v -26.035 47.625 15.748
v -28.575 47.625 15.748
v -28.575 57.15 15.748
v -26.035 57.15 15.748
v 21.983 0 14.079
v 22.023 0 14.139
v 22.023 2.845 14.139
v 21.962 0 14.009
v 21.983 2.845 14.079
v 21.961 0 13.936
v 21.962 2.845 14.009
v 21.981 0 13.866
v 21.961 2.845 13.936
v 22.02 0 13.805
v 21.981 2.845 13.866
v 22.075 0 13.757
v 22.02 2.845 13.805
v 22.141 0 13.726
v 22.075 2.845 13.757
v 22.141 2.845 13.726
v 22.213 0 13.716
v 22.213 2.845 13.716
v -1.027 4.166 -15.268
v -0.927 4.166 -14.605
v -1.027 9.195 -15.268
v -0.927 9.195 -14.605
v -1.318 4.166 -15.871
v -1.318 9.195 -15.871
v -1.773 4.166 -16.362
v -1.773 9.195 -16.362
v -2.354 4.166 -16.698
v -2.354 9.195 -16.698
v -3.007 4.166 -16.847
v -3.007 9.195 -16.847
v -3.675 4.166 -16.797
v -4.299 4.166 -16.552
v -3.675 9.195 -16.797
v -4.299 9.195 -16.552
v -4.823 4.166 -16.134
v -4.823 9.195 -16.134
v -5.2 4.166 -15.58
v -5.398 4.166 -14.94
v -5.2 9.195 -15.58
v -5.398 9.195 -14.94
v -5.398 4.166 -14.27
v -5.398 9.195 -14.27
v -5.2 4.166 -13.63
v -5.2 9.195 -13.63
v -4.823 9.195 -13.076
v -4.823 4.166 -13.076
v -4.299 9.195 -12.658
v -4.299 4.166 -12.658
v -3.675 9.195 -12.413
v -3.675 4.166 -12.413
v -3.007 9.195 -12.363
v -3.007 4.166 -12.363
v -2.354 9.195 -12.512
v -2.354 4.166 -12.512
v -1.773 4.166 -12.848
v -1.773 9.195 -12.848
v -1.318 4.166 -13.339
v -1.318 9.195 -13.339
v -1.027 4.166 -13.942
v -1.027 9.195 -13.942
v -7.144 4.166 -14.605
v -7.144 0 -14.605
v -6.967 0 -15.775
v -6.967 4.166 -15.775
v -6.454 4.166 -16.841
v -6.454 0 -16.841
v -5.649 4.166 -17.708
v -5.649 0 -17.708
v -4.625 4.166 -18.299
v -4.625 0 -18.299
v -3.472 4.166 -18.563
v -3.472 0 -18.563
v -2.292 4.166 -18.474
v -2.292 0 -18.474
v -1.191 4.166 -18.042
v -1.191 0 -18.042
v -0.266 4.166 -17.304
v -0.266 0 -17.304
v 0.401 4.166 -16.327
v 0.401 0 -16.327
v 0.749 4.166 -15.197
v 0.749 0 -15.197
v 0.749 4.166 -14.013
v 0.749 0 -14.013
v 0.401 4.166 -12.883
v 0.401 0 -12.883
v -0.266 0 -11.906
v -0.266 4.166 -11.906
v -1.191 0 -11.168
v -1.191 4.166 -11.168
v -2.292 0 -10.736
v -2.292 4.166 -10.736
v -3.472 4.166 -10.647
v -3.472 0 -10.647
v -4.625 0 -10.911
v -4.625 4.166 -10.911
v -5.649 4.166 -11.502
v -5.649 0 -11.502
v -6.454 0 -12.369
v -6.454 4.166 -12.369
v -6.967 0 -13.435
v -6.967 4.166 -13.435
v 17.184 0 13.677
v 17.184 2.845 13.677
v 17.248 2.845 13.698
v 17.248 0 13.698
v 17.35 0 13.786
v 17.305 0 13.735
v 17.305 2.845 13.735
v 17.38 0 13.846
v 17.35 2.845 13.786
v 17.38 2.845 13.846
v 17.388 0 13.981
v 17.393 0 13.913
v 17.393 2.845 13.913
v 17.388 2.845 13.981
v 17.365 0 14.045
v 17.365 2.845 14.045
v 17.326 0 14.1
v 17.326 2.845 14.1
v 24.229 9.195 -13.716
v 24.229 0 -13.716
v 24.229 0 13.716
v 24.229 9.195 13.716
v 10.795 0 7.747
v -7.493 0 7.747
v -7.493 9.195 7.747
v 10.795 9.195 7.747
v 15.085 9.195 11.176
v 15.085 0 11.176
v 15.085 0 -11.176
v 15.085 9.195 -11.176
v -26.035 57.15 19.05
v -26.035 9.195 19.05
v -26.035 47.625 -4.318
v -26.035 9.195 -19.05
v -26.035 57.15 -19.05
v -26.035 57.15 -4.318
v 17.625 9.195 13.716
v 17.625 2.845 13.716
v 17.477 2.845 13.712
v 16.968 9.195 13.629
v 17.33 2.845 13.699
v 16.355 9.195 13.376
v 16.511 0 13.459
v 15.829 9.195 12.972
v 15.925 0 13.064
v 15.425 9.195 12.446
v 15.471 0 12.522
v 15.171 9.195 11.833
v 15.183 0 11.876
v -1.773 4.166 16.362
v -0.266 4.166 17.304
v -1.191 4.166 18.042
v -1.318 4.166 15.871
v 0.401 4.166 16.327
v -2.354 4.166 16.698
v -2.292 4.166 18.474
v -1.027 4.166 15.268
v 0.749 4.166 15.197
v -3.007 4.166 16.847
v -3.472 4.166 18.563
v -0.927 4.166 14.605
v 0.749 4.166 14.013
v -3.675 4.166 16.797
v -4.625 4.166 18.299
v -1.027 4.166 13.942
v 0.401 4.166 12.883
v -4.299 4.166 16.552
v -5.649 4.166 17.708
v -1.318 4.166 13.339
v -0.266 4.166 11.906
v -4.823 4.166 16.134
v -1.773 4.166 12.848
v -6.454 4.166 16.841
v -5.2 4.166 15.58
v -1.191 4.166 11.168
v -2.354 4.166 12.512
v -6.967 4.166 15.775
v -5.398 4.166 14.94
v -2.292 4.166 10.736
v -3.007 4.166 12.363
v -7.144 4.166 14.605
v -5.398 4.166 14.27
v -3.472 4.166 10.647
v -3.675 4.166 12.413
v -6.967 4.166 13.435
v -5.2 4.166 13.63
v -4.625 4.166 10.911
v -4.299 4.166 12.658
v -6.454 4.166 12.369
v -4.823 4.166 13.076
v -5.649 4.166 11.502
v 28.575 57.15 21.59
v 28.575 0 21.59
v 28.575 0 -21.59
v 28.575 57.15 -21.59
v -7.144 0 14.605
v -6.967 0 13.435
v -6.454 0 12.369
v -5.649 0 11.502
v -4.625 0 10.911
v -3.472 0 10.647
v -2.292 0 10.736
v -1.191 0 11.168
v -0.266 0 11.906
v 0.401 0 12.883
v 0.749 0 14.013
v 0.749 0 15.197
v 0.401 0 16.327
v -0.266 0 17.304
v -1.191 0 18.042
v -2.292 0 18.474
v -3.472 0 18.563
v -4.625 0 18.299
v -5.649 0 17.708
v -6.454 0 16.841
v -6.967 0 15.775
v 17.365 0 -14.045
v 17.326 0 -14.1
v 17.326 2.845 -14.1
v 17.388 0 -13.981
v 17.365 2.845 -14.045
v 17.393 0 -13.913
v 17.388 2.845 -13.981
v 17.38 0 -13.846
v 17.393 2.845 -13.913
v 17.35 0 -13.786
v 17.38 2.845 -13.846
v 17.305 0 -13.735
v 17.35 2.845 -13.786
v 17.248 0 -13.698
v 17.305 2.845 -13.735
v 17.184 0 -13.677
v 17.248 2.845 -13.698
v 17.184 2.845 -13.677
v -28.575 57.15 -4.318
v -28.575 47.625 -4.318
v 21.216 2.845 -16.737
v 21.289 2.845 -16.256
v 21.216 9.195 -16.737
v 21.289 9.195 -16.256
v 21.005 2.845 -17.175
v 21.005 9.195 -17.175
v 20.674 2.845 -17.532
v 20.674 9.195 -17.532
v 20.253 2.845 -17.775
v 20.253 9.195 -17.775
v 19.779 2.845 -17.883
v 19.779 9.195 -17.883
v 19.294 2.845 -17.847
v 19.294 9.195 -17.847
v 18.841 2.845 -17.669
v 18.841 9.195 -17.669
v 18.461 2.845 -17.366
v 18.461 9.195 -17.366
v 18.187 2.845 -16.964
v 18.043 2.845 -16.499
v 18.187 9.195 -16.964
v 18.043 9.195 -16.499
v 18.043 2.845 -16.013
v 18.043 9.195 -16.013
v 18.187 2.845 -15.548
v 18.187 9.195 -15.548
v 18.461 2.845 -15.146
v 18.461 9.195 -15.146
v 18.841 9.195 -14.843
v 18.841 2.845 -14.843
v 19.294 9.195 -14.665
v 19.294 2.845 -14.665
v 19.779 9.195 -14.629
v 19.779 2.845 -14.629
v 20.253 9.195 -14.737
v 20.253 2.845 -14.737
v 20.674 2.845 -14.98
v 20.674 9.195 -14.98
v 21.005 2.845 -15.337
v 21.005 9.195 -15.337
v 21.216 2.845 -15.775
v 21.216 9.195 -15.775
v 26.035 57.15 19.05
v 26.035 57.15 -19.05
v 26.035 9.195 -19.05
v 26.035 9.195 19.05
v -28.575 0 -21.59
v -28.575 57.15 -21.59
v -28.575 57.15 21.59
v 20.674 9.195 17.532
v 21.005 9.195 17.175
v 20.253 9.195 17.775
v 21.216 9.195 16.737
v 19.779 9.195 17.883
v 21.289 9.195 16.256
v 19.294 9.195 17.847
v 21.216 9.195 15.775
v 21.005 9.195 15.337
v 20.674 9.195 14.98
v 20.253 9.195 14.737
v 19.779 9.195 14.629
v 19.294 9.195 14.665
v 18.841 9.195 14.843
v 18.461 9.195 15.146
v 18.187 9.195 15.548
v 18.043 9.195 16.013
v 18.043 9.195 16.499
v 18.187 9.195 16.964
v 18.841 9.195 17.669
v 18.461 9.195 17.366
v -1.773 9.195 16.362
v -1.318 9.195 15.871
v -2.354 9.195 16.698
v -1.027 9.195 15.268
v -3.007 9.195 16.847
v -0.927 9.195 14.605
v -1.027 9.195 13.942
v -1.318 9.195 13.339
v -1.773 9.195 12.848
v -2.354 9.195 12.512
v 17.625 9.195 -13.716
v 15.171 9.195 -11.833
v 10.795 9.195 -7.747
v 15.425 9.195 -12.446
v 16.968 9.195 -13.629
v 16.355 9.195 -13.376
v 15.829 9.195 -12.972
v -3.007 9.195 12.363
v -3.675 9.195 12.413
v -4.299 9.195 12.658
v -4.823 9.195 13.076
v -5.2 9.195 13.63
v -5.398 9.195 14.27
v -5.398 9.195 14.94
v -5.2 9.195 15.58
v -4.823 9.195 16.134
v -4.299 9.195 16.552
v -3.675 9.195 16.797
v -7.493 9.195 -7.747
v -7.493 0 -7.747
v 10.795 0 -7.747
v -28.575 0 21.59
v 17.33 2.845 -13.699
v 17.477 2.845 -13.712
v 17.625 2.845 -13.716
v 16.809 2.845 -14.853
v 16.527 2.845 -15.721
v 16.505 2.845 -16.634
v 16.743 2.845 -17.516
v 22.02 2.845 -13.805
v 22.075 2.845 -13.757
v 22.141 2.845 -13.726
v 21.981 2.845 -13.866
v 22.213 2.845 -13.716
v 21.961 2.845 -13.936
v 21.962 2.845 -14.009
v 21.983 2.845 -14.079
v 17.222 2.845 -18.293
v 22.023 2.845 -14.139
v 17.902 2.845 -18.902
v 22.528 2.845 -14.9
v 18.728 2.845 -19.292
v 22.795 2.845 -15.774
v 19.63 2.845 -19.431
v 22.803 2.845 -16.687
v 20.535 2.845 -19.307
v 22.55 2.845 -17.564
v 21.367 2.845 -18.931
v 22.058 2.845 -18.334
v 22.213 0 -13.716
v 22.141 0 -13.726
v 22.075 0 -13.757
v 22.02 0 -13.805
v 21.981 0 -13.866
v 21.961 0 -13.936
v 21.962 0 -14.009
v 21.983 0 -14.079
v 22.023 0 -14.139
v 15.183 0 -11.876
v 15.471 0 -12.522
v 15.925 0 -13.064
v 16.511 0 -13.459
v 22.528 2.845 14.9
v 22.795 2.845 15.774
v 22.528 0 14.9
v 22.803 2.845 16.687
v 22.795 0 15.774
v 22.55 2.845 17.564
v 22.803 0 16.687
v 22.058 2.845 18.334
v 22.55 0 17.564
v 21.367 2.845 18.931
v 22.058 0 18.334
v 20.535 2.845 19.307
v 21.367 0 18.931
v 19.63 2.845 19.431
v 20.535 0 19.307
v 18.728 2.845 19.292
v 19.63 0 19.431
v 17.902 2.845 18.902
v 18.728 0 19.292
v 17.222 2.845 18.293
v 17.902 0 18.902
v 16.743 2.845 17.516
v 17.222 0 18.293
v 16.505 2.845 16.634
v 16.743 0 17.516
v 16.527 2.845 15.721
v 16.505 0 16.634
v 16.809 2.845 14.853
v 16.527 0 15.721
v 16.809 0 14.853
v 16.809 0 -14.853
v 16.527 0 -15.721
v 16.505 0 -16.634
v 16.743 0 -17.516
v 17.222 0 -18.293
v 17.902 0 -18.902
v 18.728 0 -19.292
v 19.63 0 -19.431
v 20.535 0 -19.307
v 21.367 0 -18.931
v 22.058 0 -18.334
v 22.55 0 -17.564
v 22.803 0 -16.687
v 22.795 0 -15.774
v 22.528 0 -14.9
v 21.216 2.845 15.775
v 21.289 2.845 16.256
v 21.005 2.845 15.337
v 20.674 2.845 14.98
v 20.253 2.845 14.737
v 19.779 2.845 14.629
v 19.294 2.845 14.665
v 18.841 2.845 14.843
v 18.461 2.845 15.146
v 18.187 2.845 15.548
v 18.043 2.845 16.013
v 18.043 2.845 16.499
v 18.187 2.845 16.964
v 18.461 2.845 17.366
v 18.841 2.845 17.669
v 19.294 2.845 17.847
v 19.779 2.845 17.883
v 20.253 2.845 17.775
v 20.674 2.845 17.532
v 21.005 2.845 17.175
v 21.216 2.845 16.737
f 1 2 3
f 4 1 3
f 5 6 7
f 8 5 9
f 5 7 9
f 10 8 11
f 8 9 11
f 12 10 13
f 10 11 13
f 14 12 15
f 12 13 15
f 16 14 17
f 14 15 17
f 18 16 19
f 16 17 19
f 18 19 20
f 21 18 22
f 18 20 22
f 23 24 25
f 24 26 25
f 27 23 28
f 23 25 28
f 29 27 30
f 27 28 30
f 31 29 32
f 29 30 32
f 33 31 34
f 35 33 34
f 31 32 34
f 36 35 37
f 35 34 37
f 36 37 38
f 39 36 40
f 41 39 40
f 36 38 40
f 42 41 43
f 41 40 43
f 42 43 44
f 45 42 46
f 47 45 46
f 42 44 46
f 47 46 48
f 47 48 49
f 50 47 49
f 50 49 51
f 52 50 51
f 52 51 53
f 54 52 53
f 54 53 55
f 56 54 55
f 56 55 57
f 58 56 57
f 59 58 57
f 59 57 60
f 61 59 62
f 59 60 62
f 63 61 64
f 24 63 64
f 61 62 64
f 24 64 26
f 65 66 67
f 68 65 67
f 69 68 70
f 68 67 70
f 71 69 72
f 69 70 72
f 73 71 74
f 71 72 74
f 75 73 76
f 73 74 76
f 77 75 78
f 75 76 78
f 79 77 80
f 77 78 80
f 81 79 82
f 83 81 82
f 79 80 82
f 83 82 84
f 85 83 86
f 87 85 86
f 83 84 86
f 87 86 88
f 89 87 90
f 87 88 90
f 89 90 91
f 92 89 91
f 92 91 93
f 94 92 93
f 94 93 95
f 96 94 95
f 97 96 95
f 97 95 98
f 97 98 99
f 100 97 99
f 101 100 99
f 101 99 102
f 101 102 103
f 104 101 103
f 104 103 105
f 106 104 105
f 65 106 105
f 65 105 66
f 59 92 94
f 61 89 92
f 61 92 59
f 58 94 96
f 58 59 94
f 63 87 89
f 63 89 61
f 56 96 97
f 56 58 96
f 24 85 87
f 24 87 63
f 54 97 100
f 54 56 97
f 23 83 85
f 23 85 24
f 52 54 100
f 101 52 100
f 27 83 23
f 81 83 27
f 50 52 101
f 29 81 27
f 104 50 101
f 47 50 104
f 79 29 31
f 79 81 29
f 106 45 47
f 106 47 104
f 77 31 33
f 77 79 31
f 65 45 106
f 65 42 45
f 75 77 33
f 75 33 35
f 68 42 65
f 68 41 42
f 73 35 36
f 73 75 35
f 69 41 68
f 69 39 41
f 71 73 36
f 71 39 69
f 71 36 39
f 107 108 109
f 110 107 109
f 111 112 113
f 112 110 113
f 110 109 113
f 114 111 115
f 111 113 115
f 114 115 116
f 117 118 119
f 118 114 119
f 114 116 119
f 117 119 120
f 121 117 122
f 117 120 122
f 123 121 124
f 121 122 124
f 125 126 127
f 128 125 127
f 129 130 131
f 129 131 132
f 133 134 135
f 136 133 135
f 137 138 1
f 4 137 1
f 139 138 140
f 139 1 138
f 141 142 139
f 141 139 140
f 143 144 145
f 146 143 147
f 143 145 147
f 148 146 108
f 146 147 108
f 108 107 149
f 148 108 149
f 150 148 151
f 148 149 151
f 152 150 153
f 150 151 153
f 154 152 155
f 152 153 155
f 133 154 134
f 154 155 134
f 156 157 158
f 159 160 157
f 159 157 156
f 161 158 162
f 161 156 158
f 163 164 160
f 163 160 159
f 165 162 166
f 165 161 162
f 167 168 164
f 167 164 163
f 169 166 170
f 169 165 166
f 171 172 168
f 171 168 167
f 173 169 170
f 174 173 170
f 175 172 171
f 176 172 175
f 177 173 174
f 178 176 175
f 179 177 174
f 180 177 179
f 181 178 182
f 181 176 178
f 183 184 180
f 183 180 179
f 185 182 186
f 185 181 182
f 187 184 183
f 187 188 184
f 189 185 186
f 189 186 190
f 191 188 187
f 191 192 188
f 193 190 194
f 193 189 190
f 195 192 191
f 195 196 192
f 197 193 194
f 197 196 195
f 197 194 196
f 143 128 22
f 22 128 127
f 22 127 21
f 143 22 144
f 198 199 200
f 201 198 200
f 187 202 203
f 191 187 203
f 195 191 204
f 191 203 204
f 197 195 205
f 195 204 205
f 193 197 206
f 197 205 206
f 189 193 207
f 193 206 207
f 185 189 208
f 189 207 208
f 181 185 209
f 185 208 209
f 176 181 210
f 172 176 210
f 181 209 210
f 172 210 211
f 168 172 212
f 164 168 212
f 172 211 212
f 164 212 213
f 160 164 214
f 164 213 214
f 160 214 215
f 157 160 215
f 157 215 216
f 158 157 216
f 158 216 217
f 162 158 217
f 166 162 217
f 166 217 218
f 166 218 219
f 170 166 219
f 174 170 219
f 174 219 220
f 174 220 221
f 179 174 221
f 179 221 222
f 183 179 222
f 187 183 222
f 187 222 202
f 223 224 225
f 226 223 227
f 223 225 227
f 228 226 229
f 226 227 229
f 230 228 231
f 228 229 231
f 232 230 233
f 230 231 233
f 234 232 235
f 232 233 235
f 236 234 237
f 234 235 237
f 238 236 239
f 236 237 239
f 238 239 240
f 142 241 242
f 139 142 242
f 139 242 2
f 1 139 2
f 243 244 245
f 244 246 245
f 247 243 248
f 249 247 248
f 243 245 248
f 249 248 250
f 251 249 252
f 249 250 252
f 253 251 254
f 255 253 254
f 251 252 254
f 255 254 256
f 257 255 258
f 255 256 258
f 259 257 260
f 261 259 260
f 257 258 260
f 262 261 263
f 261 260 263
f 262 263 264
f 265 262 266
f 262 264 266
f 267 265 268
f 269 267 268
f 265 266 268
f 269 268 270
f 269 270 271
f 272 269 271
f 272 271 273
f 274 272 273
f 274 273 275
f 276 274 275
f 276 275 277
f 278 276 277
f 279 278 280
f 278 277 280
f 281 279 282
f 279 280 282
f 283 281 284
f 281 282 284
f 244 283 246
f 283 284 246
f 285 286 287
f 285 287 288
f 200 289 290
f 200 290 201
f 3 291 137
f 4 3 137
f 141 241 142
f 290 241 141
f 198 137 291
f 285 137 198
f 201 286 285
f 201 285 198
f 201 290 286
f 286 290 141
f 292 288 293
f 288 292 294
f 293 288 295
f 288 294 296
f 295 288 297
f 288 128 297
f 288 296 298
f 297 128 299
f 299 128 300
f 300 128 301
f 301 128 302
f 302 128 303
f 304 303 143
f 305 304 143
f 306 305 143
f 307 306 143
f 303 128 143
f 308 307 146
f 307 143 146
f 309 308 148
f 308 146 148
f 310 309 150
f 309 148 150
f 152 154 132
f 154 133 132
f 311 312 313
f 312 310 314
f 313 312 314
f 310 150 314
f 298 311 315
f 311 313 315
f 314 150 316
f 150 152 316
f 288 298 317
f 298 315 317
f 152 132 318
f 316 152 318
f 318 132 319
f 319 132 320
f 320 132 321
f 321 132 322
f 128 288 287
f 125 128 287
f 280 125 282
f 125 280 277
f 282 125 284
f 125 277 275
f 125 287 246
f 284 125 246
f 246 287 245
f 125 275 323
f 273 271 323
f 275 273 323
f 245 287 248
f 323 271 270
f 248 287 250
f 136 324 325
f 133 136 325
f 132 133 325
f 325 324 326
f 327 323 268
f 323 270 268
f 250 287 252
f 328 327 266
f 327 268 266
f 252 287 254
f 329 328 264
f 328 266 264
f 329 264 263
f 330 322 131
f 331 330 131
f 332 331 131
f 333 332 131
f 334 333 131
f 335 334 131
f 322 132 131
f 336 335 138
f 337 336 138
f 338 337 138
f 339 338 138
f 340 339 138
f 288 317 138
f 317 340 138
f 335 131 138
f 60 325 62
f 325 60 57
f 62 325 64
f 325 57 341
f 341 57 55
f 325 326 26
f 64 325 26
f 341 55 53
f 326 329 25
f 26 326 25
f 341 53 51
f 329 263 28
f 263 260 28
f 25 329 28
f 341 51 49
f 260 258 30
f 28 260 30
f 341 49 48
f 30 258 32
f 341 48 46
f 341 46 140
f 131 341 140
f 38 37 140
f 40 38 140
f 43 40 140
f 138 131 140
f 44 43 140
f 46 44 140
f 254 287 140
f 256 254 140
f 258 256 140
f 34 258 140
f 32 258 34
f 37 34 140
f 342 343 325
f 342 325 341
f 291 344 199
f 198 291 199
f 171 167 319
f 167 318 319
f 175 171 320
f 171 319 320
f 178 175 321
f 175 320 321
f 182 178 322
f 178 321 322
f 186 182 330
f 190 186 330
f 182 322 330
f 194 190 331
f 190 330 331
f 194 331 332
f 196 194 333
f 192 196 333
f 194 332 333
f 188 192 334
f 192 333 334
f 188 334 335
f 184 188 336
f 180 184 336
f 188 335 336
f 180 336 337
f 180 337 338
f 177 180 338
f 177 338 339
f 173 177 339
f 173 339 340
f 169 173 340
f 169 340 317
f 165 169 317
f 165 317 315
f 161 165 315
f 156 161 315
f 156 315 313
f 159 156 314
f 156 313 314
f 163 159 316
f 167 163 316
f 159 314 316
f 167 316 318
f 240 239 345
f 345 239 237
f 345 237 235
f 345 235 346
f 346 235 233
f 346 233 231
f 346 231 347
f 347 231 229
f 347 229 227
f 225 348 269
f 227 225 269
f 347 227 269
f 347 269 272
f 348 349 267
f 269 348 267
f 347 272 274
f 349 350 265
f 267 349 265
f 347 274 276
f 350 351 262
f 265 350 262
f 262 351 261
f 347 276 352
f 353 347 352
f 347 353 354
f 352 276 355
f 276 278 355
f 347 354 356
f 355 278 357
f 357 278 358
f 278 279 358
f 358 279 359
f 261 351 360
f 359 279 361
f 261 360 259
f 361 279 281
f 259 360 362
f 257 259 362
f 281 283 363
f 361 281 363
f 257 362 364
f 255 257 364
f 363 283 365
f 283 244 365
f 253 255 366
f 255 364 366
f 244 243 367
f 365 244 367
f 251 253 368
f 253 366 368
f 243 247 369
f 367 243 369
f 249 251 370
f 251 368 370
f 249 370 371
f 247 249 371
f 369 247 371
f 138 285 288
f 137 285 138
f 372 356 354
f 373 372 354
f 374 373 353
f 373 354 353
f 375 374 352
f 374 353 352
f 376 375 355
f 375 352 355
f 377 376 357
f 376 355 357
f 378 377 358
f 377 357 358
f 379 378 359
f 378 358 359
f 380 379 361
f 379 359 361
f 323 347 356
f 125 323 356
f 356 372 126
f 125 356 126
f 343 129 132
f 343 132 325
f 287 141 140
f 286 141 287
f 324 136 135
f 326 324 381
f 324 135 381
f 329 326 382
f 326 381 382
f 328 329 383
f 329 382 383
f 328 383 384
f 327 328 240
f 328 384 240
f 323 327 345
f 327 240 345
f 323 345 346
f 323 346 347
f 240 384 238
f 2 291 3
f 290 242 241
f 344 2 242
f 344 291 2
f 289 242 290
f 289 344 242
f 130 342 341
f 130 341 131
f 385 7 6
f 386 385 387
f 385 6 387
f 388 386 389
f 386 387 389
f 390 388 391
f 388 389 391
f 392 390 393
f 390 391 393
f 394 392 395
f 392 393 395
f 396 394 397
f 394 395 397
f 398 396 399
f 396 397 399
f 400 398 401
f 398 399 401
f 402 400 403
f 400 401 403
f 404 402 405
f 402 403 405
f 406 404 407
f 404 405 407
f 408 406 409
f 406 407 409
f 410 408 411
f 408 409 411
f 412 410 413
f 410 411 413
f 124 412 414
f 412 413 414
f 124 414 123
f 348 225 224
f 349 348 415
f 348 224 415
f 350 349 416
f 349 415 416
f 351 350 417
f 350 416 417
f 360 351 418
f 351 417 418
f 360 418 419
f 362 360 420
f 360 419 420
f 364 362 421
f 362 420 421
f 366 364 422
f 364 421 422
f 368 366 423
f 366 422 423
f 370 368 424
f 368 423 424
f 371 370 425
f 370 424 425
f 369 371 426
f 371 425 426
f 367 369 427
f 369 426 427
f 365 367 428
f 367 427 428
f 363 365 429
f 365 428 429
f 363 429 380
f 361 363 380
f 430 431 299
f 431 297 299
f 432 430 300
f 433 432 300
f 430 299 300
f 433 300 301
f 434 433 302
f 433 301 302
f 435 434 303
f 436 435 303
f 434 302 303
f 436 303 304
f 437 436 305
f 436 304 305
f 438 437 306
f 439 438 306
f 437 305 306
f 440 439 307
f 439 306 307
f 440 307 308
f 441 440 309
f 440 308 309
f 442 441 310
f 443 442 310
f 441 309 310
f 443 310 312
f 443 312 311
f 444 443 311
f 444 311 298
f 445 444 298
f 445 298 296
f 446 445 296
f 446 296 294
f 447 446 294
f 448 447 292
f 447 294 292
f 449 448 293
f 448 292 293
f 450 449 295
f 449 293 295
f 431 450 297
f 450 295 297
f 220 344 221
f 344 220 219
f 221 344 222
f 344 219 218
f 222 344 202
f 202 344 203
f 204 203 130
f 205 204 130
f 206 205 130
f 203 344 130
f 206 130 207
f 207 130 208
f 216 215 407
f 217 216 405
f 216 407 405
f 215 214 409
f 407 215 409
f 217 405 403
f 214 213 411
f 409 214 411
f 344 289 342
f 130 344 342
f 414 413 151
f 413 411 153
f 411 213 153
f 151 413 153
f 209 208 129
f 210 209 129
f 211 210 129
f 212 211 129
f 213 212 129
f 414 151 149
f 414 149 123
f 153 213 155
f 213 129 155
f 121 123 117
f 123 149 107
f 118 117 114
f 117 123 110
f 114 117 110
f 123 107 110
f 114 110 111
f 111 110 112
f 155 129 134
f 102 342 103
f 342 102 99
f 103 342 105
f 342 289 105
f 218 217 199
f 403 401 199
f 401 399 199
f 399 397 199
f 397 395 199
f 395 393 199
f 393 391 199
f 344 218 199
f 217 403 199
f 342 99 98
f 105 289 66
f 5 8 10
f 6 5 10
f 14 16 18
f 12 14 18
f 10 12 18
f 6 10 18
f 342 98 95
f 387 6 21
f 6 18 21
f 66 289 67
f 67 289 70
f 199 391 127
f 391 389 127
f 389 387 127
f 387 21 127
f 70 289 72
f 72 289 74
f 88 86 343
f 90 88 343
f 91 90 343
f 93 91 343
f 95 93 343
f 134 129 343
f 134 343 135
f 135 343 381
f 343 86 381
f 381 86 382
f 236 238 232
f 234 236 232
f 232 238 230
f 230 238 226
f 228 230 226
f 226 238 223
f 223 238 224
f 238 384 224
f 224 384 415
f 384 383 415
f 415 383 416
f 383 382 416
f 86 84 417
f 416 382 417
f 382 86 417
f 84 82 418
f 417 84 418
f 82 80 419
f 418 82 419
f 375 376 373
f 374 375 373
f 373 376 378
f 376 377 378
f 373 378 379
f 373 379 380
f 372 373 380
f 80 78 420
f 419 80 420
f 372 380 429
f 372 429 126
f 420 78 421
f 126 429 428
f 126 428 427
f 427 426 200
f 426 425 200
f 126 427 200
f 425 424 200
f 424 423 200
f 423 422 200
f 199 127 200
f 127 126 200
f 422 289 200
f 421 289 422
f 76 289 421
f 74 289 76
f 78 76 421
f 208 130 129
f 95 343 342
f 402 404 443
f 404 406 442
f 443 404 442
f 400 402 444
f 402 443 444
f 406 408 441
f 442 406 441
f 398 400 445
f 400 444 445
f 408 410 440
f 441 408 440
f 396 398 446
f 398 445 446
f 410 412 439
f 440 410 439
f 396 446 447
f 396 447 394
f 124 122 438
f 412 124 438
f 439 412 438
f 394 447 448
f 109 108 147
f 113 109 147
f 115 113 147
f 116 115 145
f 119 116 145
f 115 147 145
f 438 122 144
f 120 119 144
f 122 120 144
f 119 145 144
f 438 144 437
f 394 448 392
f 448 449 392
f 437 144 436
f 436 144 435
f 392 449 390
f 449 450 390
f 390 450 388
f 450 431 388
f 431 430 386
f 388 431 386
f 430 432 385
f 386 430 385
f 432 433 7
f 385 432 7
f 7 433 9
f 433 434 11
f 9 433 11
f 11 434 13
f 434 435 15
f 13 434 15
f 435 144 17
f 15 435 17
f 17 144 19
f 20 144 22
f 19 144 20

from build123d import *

# Parameters (mm, degrees)
SKETCH1_W                                      = 57.14999999999999
SKETCH1_H                                      = 43.17999999999999
BASE_DEPTH                                     = 57.15
POCKET_DEPTH                                   = 47.9552
LINACTHOLE_DEPTH                               = 68.44465304974146
ROLLMOTORHOLE_REACH                            = 85.656
DVIHOLE_REACH                                  = 69.445
CBORE_FOR_4_SOCKET_HEAD_CAP_SCREW1_D           = 3.2639
CBORE_FOR_4_SOCKET_HEAD_CAP_SCREW1_CBORE_D     = 6.35
CBORE_FOR_4_SOCKET_HEAD_CAP_SCREW1_CBORE_DEPTH = 2.8448
CBORE_FOR_8_SOCKET_HEAD_CAP_SCREW1_D           = 4.4958
CBORE_FOR_8_SOCKET_HEAD_CAP_SCREW1_CBORE_D     = 7.9375
CBORE_FOR_8_SOCKET_HEAD_CAP_SCREW1_CBORE_DEPTH = 4.1656
FILLET1_R                                      = 0.254


with BuildPart() as part:
    # Sketch1 → Base (new body)
    with BuildSketch(Plane(origin=(0, 0, 0), x_dir=(1, 0, 0), z_dir=(0, 1, 0))):
        Rectangle(SKETCH1_W, SKETCH1_H)
    extrude(amount=BASE_DEPTH)

    # Sketch2 → Pocket (cut)
    with BuildSketch(Plane(origin=(0, 57.15, 0), x_dir=(1, 0, 0), z_dir=(0, 1, 0))):
        Polygon((26.035000000000004, -19.05), (-26.03499999999999, -19.050000000000008), (-26.03499999999999, 19.049999999999994), (26.035000000000004, 19.050000000000004), align=None)
    extrude(amount=-POCKET_DEPTH, mode=Mode.SUBTRACT)

    # Sketch3 → LinActHole (cut, through all)
    with BuildSketch(Plane(origin=(0, 0, 0), x_dir=(-1, 0, 0), z_dir=(0, -1, 0))):
        Polygon((7.492999999999988, -7.7470000000000026), (-10.79500000000001, -7.747000000000003), (-10.79500000000001, 7.746999999999995), (7.492999999999988, 7.746999999999996), align=None)
    extrude(amount=-LINACTHOLE_DEPTH, mode=Mode.SUBTRACT)

    # Sketch4 → RollMotorHole (cut, up to next)
    with BuildSketch(Plane.ZY.offset(28.575), mode=Mode.PRIVATE) as rollmotorhole_sk1:
        Polygon((15.747999999999998, 57.15), (-4.317999999999999, 57.150000000000006), (-4.317999999999998, 47.625), (15.747999999999998, 47.625000000000014), align=None)
    rollmotorhole_tool1 = extrude(rollmotorhole_sk1.sketch, amount=-ROLLMOTORHOLE_REACH, mode=Mode.PRIVATE) & part.part
    add(rollmotorhole_tool1.solids().sort_by_distance((-28.575, 52.3875, 5.715))[0], mode=Mode.SUBTRACT)

    # Sketch5 → DviHole (cut, up to next)
    with BuildSketch(Plane.XZ, mode=Mode.PRIVATE) as dvihole_sk1:
        with BuildLine():
            Line((17.624947542752004, -13.715999999999998), (24.228947542752003, -13.716))
            Line((24.228947542752003, -13.716), (24.228947542752003, 13.716000000000003))
            Line((24.228947542752003, 13.716000000000003), (17.624947542752004, 13.716000000000005))
            ThreePointArc((17.624947542752004, 13.716000000000005), (15.828896318538174, 12.972051224213832), (15.084947542752005, 11.176000000000002))
            Line((15.084947542752005, 11.176000000000002), (15.084947542752005, -11.175999999999998))
            ThreePointArc((15.084947542752005, -11.175999999999998), (15.828896318538174, -12.972051224213828), (17.624947542752004, -13.715999999999998))
        make_face()
    dvihole_tool1 = extrude(dvihole_sk1.sketch, amount=-DVIHOLE_REACH, mode=Mode.PRIVATE) & part.part
    add(dvihole_tool1.solids().sort_by_distance((19.701649, 0, 0))[0], mode=Mode.SUBTRACT)

    # CBORE for #4 Socket Head Cap Screw1 (through all)
    with Locations(Plane(origin=(0, 0, 0), x_dir=(-1, 0, 0), z_dir=(0, -1, 0))):
        with Locations((-19.656947543, 16.256), (-19.656947543, -16.256)):
            CounterBoreHole(CBORE_FOR_4_SOCKET_HEAD_CAP_SCREW1_D / 2, CBORE_FOR_4_SOCKET_HEAD_CAP_SCREW1_CBORE_D / 2, CBORE_FOR_4_SOCKET_HEAD_CAP_SCREW1_CBORE_DEPTH)

    # CBORE for #8 Socket Head Cap Screw1 (through all)
    with Locations(Plane(origin=(0, 0, 0), x_dir=(-1, 0, 0), z_dir=(0, -1, 0))):
        with Locations((3.175, 14.605), (3.175, -14.605)):
            CounterBoreHole(CBORE_FOR_8_SOCKET_HEAD_CAP_SCREW1_D / 2, CBORE_FOR_8_SOCKET_HEAD_CAP_SCREW1_CBORE_D / 2, CBORE_FOR_8_SOCKET_HEAD_CAP_SCREW1_CBORE_DEPTH)

    # Fillet1
    # the kernel refuses this fillet: 0.254 mm, written as the material it takes off along each edge
    with BuildSketch(Plane(origin=(21.56194754300001, 2.8448, 13.716000000000006), x_dir=(1, 0, -5.46e-15), z_dir=(0, -1, 0))) as fillet1_piece_1:
        with BuildLine():
            CenterArc((0.6508256982823206, 0.25399999999999956), FILLET1_R, 138.18968510422349, 131.8103148957768)
            ThreePointArc((0.4615052761873327, 0.4233333333333256), (0.24121576475939824, 0.20026008045803986), (0, 0))
            Line((0, 0), (0.650825698282322, 0))
        make_face()
    extrude(amount=4.471864245705805, mode=Mode.SUBTRACT)
    with BuildSketch(Plane(origin=(17.751947542999993, 2.8448, 13.716000000000006), x_dir=(-0.9977003347705025, 0, -0.06777936263220105), z_dir=(0, -1, 0))) as fillet1_piece_2:
        with BuildLine():
            CenterArc((0.5964633639844708, -0.2525550871245977), FILLET1_R, 96.11431340709308, 122.7684855876463)
            Line((0.3987417282209075, -0.4119983521155698), (0.37896956464454973, -0.4279426786146676))
            ThreePointArc((0.37896956464454973, -0.4279426786146676), (0.19043822259418336, -0.21464439732501625), (-0.01658222975058737, -0.01924031331602186))
            Line((-0.01658222975058737, -0.01924031331602186), (0.00172159581085787, 0.02534158850317019))
            ThreePointArc((0.00172159581085787, 0.02534158850317019), (0.12842953857413036, 0.01673360943207212), (0.5667037799709318, 0.02525550871246005))
            Line((0.5667037799709318, 0.02525550871246005), (0.5694091966994345, 0))
        make_face()
    extrude(amount=4.278191101484826, mode=Mode.SUBTRACT)
    with BuildSketch(Plane(origin=(17.751947543000007, 2.8448, -13.715999999999996), x_dir=(-0.9977003347705027, 0, 0.06777936263219668), z_dir=(0, -1, 0))) as fillet1_piece_3:
        with BuildLine():
            CenterArc((0.5964633639844823, 0.25255508712459757), FILLET1_R, 141.1172010052604, 122.76848558764627)
            Line((0.3987417282209198, 0.4119983521155705), (0.37896956464456205, 0.4279426786146684))
            ThreePointArc((0.37896956464456205, 0.4279426786146684), (0.19043822259419124, 0.21464439732501767), (-0.01658222975058728, 0.01924031331602193))
            Line((-0.01658222975058728, 0.01924031331602193), (0.00172159581085776, -0.02534158850317019))
            ThreePointArc((0.00172159581085776, -0.02534158850317019), (0.12842953857414433, -0.01673360943206995), (0.5667037799709422, -0.02525550871246003))
            Line((0.5667037799709422, -0.02525550871246003), (0.5694091966994449, 0))
        make_face()
    extrude(amount=4.278191101484849, mode=Mode.SUBTRACT)
    with BuildSketch(Plane(origin=(21.561947542999995, 2.8448, -13.715999999999996), x_dir=(1, 0, -5.46e-15), z_dir=(0, -1, 0))) as fillet1_piece_4:
        with BuildLine():
            CenterArc((0.6508256982823268, -0.25399999999999956), FILLET1_R, 90.0000000000003, 131.81031489577913)
            ThreePointArc((0.46150527618734805, -0.42333333333333484), (0.2412157647594075, -0.20026008045804258), (0, 0))
            Line((0, 0), (0.6508256982823255, 0))
        make_face()
    extrude(amount=4.471864245705815, mode=Mode.SUBTRACT)


solid = part.part
